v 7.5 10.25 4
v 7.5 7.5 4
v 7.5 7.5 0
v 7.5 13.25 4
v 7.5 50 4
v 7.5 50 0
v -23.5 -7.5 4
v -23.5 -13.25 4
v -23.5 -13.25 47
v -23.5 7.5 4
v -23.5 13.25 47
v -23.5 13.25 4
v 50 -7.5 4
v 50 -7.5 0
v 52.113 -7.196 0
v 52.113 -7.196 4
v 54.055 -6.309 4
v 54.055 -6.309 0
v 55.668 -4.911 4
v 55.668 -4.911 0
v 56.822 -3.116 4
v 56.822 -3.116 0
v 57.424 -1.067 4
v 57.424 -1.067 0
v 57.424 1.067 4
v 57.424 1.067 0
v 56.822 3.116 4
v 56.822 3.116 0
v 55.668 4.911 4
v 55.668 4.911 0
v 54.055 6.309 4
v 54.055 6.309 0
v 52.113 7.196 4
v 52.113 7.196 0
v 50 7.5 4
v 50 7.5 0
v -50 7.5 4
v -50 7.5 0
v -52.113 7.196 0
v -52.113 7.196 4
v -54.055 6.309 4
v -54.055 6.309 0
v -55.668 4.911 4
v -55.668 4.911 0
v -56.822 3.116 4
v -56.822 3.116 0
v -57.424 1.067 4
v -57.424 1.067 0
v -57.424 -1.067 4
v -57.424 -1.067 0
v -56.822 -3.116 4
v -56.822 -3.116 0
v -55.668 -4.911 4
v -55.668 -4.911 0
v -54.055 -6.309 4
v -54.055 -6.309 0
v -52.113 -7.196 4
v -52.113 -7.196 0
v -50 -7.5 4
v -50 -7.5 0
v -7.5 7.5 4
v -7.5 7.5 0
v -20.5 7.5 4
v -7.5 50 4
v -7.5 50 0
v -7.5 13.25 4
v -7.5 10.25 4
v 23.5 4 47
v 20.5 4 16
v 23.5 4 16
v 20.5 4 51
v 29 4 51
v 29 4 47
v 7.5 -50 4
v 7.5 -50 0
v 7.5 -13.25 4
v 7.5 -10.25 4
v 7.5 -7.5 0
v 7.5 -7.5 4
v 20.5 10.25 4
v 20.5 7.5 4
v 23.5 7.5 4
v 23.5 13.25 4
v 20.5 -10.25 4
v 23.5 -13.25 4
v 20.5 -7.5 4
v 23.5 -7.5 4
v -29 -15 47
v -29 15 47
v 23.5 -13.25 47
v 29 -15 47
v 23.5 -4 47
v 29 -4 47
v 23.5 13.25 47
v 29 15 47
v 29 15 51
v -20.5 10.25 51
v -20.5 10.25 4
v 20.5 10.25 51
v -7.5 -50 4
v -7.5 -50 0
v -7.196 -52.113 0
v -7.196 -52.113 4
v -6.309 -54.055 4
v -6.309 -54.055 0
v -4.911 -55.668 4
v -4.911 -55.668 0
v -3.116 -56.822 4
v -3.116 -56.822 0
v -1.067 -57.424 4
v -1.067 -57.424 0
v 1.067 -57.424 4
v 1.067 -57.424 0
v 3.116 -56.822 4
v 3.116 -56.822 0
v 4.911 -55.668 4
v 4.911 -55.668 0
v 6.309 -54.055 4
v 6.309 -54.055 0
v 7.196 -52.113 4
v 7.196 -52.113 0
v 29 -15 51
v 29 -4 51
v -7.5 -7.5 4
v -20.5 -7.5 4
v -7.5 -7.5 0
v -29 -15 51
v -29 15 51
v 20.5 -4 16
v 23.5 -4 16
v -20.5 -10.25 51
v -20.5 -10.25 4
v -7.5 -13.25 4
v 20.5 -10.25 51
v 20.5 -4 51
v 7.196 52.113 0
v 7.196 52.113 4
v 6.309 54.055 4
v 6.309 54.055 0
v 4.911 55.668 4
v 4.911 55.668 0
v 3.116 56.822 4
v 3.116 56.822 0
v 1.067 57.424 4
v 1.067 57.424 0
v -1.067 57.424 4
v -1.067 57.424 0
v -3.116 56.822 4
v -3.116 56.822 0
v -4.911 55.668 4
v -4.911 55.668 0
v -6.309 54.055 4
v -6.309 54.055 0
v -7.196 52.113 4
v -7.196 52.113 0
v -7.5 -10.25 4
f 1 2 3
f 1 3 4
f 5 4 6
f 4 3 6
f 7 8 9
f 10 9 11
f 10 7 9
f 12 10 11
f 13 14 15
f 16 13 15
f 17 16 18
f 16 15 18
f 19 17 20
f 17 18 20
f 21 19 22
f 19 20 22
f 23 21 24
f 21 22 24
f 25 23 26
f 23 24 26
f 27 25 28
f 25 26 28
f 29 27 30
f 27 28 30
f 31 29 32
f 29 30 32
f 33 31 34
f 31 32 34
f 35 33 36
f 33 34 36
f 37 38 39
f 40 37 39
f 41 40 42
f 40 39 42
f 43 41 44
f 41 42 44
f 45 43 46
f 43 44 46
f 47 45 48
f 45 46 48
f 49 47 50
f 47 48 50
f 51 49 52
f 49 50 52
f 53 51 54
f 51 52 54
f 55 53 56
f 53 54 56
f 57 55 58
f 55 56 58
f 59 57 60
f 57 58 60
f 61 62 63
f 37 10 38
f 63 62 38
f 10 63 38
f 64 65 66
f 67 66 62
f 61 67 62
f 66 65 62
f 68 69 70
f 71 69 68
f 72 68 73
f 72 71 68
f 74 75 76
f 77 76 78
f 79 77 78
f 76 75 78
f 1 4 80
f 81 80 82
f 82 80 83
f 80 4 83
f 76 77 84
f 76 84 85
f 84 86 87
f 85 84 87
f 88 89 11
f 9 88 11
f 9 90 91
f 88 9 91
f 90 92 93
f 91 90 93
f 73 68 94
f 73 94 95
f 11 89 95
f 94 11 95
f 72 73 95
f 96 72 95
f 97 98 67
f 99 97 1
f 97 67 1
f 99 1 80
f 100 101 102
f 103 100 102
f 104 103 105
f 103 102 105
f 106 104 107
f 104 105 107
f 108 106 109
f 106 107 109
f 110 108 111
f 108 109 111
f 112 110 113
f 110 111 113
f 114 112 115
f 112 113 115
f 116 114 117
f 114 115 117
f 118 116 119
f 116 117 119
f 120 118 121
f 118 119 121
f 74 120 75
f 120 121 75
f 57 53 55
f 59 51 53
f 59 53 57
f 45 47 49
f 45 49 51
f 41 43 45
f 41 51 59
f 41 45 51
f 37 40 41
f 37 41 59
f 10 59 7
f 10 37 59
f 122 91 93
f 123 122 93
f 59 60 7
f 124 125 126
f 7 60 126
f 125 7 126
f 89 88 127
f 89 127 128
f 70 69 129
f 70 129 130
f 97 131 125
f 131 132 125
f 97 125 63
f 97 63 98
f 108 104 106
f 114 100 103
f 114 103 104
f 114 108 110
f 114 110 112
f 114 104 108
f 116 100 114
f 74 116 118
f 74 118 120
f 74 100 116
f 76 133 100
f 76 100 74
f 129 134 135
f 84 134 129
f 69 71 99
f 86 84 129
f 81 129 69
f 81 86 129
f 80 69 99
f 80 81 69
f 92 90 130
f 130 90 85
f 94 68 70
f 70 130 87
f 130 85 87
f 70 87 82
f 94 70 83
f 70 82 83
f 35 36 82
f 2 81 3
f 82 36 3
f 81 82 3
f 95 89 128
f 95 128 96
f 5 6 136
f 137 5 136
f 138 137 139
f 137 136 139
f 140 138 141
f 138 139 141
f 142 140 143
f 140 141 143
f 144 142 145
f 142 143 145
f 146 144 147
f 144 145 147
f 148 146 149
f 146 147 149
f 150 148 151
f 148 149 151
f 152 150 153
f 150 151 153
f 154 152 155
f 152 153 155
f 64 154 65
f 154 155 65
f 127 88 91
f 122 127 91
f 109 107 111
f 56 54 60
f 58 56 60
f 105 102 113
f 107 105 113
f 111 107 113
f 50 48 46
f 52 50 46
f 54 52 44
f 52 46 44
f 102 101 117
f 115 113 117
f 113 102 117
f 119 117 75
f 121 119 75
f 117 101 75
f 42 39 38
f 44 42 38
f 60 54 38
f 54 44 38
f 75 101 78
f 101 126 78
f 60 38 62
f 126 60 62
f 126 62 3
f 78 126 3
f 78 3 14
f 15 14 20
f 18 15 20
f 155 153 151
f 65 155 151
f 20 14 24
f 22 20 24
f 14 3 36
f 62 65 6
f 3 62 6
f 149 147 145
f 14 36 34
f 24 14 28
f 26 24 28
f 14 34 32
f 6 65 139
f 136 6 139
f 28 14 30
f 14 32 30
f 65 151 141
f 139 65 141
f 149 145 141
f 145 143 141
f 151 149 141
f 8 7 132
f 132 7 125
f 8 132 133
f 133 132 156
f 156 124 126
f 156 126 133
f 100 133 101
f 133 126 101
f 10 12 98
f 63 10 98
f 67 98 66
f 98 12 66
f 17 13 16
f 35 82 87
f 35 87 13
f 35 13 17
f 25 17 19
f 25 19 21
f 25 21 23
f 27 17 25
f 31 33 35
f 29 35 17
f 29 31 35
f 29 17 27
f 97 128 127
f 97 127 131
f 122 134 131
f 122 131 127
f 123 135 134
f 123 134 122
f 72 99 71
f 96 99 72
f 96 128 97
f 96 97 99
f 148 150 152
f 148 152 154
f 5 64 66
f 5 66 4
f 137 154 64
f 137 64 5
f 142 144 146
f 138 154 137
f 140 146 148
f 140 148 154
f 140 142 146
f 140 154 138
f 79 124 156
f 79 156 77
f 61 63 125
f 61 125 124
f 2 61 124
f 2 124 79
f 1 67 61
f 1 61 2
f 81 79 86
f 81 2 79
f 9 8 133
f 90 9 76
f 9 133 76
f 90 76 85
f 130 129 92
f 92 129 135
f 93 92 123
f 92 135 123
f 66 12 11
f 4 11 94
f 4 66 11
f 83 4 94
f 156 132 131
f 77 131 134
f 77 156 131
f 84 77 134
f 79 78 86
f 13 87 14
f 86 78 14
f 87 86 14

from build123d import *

# Parameters (mm, degrees)
EXTRUDE_1_DEPTH     = 4
SKETCH_2_W          = 47
SKETCH_2_H          = 26.5
SKETCH_2_W_2        = 41
SKETCH_2_H_2        = 20.5
EXTRUDE_2_DEPTH     = 43
SKETCH_3_W          = 58
SKETCH_3_H          = 30
SKETCH_3_W_2        = 41
SKETCH_3_H_2        = 20.5
EXTRUDE_3_DEPTH     = 4
SKETCH_4_W          = 43.435998006
SKETCH_4_H          = 8
CUT_EXTRUDE_1_DEPTH = 35


with BuildPart() as part:
    # 草图1 → 凸台-拉伸1 (new body)
    with BuildSketch(Plane.XY):
        with BuildLine():
            Line((-7.5, 50), (-7.5, 7.5))
            Line((-7.5, 7.5), (-50, 7.5))
            ThreePointArc((-50, 7.5), (-57.5, 0), (-50, -7.5))
            Line((-50, -7.5), (-7.5, -7.5))
            Line((-7.5, -7.5), (-7.5, -50))
            ThreePointArc((-7.5, -50), (0, -57.5), (7.5, -50))
            Line((7.5, -50), (7.5, -7.5))
            Line((7.5, -7.5), (50, -7.5))
            ThreePointArc((50, -7.5), (57.5, 0), (50, 7.5))
            Line((50, 7.5), (7.5, 7.5))
            Line((7.5, 7.5), (7.5, 50))
            ThreePointArc((7.5, 50), (0, 57.5), (-7.5, 50))
        make_face()
    extrude(amount=EXTRUDE_1_DEPTH)

    # 草图2 → 凸台-拉伸2 (add)
    with BuildSketch(Plane.XY.offset(4)):
        Rectangle(SKETCH_2_W, SKETCH_2_H)
        Rectangle(SKETCH_2_W_2, SKETCH_2_H_2, mode=Mode.SUBTRACT)
    extrude(amount=EXTRUDE_2_DEPTH)

    # 草图3 → 凸台-拉伸3 (add)
    with BuildSketch(Plane.XY.offset(47)):
        Rectangle(SKETCH_3_W, SKETCH_3_H)
        Rectangle(SKETCH_3_W_2, SKETCH_3_H_2, mode=Mode.SUBTRACT)
    extrude(amount=EXTRUDE_3_DEPTH)

    # 草图4 → 切除-拉伸1 (cut)
    with BuildSketch(Plane.XY.offset(51)):
        with Locations((17.279283878, 0)):
            Rectangle(SKETCH_4_W, SKETCH_4_H)
    extrude(amount=-CUT_EXTRUDE_1_DEPTH, mode=Mode.SUBTRACT)


solid = part.part
